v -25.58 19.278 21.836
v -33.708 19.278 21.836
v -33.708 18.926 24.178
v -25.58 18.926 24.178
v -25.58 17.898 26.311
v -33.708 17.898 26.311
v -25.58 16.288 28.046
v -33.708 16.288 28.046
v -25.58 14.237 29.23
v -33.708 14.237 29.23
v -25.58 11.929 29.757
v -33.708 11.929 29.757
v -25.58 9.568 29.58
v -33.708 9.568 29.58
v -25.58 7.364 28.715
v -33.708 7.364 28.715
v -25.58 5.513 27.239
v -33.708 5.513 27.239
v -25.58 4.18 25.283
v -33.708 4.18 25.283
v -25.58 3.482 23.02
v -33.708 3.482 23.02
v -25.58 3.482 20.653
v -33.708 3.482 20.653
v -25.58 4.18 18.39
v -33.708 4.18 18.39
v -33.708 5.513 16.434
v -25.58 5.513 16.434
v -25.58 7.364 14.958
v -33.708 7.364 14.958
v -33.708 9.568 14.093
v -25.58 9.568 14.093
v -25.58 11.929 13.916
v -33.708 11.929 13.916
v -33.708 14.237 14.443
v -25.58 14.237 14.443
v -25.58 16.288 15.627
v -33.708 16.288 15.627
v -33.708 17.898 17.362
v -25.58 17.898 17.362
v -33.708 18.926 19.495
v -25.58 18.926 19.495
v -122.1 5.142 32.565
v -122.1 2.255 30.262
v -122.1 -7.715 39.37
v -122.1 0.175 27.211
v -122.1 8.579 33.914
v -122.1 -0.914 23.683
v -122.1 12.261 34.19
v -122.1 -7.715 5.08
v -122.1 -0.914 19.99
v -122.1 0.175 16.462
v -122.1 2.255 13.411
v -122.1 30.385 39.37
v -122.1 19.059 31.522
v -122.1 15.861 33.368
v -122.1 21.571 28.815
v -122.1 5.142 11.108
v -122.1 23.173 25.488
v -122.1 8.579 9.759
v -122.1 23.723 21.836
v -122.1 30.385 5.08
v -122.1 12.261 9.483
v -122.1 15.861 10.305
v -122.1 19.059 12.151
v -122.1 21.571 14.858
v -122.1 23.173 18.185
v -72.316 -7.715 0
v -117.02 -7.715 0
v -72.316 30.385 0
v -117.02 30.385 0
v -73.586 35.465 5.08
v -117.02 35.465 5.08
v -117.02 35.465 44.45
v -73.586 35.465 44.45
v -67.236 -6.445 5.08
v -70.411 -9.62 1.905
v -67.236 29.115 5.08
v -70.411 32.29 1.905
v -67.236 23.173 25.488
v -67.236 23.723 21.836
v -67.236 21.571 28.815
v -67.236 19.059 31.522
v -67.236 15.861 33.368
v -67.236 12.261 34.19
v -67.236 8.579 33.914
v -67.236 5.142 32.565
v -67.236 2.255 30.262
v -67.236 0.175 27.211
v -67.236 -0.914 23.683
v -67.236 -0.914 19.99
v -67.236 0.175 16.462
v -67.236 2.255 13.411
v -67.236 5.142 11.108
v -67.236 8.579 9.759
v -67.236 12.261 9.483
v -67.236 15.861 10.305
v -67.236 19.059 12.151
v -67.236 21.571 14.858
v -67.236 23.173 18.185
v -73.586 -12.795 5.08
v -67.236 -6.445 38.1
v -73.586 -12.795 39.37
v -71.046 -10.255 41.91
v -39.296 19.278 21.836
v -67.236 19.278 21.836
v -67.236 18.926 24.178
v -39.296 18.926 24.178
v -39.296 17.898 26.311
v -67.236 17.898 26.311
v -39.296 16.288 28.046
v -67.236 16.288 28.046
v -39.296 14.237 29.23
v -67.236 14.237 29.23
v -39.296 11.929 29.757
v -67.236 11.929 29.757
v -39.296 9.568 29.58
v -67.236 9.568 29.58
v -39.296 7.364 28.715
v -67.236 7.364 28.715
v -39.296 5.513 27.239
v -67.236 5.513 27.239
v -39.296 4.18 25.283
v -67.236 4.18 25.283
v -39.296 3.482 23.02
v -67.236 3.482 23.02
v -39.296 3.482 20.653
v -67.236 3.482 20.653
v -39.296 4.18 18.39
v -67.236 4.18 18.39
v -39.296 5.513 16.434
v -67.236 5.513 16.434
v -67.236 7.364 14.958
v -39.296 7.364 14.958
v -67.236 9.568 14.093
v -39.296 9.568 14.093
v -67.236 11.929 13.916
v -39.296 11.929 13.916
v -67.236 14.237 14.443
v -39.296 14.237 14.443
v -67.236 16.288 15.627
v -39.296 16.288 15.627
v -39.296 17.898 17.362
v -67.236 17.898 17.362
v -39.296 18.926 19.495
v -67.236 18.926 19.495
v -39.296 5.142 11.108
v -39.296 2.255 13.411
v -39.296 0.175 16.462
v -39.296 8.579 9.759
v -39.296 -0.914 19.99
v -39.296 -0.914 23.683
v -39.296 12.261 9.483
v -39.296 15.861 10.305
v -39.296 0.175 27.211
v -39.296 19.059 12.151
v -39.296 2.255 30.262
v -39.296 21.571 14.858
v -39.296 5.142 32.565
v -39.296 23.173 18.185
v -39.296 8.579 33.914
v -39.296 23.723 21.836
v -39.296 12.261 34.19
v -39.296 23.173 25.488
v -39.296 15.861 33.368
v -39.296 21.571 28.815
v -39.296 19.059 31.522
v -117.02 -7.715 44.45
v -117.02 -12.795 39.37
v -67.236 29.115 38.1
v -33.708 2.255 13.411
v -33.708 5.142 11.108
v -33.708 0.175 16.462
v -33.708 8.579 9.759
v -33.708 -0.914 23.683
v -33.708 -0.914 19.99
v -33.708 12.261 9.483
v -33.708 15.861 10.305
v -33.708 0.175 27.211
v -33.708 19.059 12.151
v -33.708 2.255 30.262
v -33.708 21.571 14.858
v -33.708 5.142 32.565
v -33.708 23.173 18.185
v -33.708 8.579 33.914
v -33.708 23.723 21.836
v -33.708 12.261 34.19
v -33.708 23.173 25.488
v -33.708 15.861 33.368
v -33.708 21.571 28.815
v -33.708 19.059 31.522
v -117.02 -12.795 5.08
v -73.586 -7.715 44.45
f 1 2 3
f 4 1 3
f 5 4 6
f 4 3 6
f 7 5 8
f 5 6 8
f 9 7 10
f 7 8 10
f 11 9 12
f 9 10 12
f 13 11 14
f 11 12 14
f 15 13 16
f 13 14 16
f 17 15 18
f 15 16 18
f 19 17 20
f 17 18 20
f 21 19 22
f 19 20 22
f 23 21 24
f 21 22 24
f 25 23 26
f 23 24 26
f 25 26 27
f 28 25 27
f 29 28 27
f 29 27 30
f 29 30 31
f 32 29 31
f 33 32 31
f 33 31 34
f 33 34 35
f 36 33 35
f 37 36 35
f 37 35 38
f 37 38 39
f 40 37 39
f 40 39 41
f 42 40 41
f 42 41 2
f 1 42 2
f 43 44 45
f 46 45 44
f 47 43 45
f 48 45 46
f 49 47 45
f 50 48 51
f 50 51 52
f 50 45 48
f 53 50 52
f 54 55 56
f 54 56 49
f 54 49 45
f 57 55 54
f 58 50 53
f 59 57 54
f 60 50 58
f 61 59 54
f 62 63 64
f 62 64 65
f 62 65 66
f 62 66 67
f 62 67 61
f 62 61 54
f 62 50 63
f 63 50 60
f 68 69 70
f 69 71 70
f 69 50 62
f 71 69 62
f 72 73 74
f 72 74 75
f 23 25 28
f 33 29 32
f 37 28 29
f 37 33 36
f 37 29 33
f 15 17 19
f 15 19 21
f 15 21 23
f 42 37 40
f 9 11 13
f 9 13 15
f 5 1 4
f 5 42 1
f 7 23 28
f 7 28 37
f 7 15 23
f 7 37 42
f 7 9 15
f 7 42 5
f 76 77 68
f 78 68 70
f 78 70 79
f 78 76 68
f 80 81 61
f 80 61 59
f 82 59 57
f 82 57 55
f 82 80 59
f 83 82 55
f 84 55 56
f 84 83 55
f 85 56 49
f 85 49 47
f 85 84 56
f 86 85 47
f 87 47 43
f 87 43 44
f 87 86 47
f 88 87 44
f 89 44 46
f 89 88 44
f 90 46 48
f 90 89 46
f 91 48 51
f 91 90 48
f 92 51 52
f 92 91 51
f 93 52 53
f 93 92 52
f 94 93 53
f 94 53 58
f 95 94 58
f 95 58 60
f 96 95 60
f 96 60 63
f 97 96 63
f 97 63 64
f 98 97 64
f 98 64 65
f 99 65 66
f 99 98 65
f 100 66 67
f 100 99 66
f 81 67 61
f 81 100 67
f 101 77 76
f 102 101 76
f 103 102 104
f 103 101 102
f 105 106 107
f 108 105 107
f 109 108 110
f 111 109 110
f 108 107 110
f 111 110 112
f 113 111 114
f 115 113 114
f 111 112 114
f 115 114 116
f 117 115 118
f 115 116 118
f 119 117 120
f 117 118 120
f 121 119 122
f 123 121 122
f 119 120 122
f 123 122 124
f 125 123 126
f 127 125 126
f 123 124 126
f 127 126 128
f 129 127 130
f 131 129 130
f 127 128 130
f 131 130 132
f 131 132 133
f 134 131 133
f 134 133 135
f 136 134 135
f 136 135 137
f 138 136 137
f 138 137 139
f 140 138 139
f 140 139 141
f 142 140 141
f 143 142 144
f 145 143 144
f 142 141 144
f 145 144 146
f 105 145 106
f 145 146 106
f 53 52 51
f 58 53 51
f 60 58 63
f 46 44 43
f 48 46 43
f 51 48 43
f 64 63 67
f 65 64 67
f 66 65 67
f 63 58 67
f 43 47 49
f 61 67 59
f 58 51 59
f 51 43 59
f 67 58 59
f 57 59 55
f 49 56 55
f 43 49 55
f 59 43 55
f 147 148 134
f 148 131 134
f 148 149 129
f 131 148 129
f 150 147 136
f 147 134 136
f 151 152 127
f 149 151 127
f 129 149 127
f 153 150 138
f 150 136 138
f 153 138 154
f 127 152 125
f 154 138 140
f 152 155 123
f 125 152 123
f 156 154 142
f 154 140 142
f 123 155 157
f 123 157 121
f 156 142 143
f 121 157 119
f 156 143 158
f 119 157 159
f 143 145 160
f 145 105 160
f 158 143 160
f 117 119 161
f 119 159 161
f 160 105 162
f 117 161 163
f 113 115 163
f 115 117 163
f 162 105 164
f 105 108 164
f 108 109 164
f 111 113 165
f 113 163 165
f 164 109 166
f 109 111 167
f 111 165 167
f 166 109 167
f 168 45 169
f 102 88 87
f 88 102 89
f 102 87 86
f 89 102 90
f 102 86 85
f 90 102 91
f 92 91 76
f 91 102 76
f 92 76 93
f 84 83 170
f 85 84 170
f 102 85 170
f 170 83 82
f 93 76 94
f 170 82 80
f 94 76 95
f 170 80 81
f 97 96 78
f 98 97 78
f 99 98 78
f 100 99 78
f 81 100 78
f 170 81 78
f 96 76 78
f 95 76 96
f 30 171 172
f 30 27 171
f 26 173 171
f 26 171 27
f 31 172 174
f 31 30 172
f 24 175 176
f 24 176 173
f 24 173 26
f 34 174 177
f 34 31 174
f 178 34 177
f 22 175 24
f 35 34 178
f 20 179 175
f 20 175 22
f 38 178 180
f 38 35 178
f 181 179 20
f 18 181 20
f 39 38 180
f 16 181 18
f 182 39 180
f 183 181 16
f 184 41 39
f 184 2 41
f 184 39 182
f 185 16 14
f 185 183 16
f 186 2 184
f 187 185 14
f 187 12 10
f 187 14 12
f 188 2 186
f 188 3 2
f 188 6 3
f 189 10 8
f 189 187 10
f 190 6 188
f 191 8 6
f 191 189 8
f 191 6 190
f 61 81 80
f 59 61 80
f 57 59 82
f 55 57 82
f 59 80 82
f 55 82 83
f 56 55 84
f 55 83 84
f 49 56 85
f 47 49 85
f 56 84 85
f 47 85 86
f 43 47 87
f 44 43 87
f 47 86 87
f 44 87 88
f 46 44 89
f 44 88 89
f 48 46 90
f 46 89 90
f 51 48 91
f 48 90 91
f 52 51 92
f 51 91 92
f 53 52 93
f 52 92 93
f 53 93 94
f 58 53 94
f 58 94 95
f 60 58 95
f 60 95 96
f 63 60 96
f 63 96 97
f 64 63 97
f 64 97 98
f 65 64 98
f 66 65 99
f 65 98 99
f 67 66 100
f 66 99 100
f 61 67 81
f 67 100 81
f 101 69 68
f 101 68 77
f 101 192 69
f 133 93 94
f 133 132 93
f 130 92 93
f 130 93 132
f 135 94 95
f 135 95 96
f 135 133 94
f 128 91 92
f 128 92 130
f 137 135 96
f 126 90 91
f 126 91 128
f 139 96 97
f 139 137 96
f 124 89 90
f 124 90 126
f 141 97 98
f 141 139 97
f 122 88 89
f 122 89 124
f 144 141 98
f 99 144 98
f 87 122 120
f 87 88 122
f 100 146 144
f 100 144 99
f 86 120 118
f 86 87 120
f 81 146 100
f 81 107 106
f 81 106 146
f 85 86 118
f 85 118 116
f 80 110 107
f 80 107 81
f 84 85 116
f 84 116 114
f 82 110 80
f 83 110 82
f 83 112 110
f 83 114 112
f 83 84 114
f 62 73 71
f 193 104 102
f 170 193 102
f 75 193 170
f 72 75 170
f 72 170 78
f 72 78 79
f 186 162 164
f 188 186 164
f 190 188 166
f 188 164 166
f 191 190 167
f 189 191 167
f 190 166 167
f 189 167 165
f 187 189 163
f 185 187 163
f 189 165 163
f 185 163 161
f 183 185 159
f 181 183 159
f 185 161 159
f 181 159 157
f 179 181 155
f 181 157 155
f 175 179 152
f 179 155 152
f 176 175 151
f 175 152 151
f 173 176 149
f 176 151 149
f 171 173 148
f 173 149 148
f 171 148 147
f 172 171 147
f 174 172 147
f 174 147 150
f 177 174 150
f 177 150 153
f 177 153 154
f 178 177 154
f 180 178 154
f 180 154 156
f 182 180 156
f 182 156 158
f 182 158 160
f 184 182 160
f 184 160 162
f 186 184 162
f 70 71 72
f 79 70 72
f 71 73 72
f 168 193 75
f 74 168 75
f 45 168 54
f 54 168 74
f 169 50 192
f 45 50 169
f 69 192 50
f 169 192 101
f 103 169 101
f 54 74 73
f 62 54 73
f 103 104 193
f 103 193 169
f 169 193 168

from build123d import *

# Parameters (mm, degrees)
F0_W     = 54.864
F0_H     = 48.26
F1_DEPTH = 44.45
F2_R     = 7.9426697317
F3_DEPTH = 41.656
F2_R_2   = 12.3876697317
F4_DEPTH = 33.528
F5_DEPTH = 36.83
F6_DEPTH = 27.94
F2_W     = 48.26
F2_H     = 44.45
F7_DEPTH = 54.864
F8_DEPTH = 54.864
F9_SIZE  = 6.35
F10_SIZE = 5.08


with BuildPart() as f1:
    # F0 (on Top) → F1 (new body)
    with BuildSketch(Plane.XY):
        with Locations((-94.6675501764, 11.3354255426)):
            Rectangle(F0_W, F0_H)
    extrude(amount=F1_DEPTH)

    # F5 (cut): a face of the model
    f5_faces = [f1.faces().sort_by_distance(p)[0] for p in [
        (-94.6675501764, 11.3354255426, 44.45),
    ]]
    extrude(f5_faces, amount=-F5_DEPTH, mode=Mode.SUBTRACT)

    # F2 (on face) → F7 (join, through all)
    with BuildSketch(Plane.YZ.offset(-67.2355501764)):
        with Locations((11.3354255426, 22.225)):
            Rectangle(F2_W, F2_H)
        with Locations((11.3357125817, 21.8364697298)):
            Circle(F2_R_2, mode=Mode.SUBTRACT)
    extrude(amount=-F7_DEPTH)

    # F9
    f9_edges = [f1.edges().sort_by_distance(p)[0] for p in [
        (-67.23555, 11.335426, 44.45),
        (-67.23555, -12.794574, 22.225),
        (-67.23555, 35.465426, 22.225),
    ]]
    chamfer(f9_edges, length=F9_SIZE)

    # F10 (call 1 of 2: OpenCascade refuses the feature's edges together)
    f10_edges = [f1.edges().sort_by_distance(p)[0] for p in [
        (-97.84255, -12.794574, 0),
        (-122.09955, -12.794574, 22.225),
        (-122.09955, 11.335426, 44.45),
        (-122.09955, 35.465426, 22.225),
        (-97.84255, 35.465426, 0),
        (-122.09955, 11.335426, 0),
        (-97.84255, -12.794574, 44.45),
    ]]
    chamfer(f10_edges, length=F10_SIZE)

    # F10#2 (call 2 of 2)
    f10_2_edges = [f1.edges().sort_by_distance(p)[0] for p in [
        (-67.23555, 11.335426, 0),
    ]]
    chamfer(f10_2_edges, length=F10_SIZE)


with BuildPart() as f3:
    # F2 (on face) → F3 (new body)
    with BuildSketch(Plane.YZ.offset(-67.2355501764)):
        with Locations((11.3357125817, 21.8364697298)):
            Circle(F2_R)
    extrude(amount=F3_DEPTH)

    # F2 (on face) → F4 (join)
    with BuildSketch(Plane.YZ.offset(-67.2355501764)):
        with Locations((11.3357125817, 21.8364697298)):
            Circle(F2_R_2)
        with Locations((11.3357125817, 21.8364697298)):
            Circle(F2_R, mode=Mode.SUBTRACT)
    extrude(amount=F4_DEPTH)

    # F2 (on face) → F6 (cut)
    with BuildSketch(Plane.YZ.offset(-67.2355501764)):
        with Locations((11.3357125817, 21.8364697298)):
            Circle(F2_R_2)
        with Locations((11.3357125817, 21.8364697298)):
            Circle(F2_R, mode=Mode.SUBTRACT)
    extrude(amount=F6_DEPTH, mode=Mode.SUBTRACT)

    # F2 (on face) → F8 (join, through all)
    with BuildSketch(Plane.YZ.offset(-67.2355501764)):
        with Locations((11.3357125817, 21.8364697298)):
            Circle(F2_R_2)
        with Locations((11.3357125817, 21.8364697298)):
            Circle(F2_R, mode=Mode.SUBTRACT)
        with Locations((11.3357125817, 21.8364697298)):
            Circle(F2_R)
    extrude(amount=-F8_DEPTH)


solid = Compound([f1.part, f3.part])
